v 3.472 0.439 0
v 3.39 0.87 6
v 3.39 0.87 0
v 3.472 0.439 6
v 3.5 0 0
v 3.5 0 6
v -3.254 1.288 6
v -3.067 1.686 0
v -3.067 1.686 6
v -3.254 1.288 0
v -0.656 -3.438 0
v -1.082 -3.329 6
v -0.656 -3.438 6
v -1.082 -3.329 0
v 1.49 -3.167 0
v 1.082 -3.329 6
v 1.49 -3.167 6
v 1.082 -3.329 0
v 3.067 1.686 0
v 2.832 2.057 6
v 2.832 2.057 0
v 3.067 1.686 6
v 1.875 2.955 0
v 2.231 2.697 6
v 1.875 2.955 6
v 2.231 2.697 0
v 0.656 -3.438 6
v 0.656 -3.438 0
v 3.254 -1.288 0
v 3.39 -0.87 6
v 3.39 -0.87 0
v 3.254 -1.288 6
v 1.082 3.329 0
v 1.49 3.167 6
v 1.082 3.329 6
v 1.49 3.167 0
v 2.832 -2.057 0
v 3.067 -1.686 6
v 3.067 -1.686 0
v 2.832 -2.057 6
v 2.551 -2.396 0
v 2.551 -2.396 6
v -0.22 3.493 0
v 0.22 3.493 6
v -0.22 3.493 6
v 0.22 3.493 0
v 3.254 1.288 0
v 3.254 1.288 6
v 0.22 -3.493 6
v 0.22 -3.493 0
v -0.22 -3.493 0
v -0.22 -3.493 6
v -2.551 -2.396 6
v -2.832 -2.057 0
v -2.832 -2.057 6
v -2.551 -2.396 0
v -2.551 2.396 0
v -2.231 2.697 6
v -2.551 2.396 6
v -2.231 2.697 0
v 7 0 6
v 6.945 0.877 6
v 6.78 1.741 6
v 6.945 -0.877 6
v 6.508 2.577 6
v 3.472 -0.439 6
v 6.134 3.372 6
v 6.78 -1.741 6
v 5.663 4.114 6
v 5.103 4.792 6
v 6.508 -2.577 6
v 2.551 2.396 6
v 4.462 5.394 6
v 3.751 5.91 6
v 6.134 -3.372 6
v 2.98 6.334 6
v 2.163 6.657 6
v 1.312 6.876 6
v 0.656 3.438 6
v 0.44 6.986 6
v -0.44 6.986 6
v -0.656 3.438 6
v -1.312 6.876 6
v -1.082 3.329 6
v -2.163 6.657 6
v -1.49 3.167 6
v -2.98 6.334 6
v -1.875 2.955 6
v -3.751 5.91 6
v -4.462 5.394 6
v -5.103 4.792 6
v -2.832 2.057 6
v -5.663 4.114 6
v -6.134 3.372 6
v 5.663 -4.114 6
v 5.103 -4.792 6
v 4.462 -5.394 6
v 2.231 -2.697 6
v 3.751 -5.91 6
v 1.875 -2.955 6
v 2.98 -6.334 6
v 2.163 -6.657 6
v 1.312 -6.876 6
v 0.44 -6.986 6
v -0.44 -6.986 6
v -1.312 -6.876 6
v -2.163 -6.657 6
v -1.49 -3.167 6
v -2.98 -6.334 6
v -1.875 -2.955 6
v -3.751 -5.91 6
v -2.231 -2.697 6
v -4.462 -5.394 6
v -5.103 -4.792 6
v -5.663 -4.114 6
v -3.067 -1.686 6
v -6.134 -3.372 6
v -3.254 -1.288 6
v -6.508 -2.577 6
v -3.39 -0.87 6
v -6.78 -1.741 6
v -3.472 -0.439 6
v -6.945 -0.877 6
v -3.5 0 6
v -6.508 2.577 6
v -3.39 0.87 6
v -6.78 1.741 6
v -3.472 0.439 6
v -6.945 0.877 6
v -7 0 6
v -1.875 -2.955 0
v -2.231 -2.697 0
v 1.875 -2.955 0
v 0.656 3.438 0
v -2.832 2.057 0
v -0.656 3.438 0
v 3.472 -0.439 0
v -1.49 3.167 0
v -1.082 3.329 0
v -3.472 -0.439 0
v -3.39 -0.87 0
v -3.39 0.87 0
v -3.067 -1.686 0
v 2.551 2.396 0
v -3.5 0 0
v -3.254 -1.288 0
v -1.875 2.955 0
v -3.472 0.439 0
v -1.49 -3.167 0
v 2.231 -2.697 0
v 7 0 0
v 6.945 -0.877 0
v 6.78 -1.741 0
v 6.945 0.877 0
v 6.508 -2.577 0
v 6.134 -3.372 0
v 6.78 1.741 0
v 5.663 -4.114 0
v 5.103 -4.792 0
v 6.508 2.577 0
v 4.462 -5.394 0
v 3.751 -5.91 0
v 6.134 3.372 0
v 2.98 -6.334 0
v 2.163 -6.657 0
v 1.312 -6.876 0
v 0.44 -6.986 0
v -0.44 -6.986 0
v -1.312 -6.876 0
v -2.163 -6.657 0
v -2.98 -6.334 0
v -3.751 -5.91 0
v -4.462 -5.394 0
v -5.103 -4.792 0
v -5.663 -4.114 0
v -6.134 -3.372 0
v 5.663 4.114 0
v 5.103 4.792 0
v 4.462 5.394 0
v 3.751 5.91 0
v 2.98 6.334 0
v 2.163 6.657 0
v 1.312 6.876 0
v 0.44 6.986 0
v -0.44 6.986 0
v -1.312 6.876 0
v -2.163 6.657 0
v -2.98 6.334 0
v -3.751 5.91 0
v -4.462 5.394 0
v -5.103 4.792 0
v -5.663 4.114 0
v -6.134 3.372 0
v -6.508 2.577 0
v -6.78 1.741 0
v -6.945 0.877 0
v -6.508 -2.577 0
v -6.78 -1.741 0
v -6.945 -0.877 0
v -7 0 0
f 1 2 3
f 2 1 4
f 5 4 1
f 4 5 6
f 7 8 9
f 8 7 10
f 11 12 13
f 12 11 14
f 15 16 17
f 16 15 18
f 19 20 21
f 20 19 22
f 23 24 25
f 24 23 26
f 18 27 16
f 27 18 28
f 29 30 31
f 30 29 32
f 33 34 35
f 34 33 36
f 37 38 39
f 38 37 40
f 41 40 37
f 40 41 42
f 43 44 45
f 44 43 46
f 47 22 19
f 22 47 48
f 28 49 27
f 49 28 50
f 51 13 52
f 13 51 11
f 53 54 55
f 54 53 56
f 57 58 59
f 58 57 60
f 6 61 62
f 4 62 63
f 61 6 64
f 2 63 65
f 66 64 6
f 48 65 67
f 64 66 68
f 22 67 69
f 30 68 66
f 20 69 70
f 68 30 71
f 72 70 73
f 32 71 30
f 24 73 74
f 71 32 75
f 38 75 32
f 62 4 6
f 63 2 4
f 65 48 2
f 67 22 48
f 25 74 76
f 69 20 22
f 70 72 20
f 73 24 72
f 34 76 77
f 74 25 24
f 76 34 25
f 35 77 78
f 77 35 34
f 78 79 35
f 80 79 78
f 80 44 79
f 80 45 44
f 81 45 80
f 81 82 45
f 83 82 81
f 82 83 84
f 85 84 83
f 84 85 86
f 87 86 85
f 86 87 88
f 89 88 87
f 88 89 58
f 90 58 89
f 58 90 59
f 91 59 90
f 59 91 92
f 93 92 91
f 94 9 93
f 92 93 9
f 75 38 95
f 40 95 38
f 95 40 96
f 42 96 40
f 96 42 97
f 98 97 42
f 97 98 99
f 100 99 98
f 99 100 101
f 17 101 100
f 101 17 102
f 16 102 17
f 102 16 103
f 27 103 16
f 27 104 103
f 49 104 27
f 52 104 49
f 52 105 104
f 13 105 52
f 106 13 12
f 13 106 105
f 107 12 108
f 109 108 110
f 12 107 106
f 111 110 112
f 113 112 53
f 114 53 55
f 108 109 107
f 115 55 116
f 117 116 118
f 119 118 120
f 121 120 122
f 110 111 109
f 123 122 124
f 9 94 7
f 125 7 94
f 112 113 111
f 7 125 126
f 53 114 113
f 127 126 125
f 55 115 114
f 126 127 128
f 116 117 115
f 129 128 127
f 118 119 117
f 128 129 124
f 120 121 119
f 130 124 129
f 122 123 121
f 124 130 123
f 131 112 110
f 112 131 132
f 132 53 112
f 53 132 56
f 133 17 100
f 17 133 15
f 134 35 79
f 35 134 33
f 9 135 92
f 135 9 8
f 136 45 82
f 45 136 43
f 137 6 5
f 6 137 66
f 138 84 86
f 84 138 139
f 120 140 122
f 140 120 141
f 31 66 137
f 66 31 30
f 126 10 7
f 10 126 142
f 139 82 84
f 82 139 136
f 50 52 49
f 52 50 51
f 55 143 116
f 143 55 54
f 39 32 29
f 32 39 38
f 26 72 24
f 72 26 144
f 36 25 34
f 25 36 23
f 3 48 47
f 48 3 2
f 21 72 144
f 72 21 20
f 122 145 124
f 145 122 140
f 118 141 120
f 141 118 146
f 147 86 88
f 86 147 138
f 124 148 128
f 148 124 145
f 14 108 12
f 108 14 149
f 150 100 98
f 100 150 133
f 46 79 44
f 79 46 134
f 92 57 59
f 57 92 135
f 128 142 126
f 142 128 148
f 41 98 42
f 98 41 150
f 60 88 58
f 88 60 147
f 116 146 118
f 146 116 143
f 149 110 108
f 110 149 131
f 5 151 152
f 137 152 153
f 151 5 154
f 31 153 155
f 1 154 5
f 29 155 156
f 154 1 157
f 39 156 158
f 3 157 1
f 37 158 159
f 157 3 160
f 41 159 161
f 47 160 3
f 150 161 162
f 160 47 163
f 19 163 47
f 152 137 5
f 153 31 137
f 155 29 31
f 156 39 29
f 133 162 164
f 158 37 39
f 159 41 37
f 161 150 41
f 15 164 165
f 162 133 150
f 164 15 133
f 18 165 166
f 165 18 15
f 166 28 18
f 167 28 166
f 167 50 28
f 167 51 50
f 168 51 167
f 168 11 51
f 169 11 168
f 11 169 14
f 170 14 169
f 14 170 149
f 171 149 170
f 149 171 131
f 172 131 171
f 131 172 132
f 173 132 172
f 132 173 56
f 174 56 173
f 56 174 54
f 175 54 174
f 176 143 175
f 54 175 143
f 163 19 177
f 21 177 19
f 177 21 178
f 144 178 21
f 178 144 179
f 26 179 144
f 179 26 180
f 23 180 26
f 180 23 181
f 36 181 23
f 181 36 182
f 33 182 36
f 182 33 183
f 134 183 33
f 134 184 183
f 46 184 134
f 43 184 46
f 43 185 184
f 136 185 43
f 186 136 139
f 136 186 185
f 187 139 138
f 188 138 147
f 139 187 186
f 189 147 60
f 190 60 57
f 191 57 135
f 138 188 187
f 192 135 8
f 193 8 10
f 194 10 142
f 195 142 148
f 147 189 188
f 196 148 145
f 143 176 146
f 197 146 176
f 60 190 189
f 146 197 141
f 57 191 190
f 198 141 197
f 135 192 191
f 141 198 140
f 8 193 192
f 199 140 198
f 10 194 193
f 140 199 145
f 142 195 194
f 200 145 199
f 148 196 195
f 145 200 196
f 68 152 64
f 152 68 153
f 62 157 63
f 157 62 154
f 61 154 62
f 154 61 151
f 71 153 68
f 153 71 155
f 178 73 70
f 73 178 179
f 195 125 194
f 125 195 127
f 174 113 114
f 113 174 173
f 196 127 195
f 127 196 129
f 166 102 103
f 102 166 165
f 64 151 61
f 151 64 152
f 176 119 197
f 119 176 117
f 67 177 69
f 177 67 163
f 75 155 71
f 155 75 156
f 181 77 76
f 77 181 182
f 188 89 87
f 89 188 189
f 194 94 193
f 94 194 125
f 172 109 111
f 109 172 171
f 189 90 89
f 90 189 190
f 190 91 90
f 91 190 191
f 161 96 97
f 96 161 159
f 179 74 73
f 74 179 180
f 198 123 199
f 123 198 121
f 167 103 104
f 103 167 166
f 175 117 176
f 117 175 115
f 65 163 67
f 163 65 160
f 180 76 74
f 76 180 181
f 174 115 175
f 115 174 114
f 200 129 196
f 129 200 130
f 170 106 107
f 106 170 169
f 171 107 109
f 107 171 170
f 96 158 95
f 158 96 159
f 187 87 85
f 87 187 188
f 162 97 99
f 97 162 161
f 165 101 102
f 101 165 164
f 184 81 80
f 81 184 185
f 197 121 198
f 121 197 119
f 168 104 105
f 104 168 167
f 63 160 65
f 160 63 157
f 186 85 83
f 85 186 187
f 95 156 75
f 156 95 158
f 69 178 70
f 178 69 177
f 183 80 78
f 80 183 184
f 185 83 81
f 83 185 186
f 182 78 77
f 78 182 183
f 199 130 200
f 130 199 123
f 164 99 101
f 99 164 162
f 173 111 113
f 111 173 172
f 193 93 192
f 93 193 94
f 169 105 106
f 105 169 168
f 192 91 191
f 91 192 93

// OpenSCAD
$fn = 50;


difference() {
	union() {
		cylinder(h = 6, r = 7.0000000000);
	}
	union() {
		#translate(v = [0.0000000000, 0.0000000000, -100.0000000000]) {
			cylinder(h = 200, r = 3.2500000000);
		}
		#translate(v = [0.0000000000, 0.0000000000, -100.0000000000]) {
			cylinder(h = 200, r = 3.2500000000);
		}
		#translate(v = [0.0000000000, 0.0000000000, -100.0000000000]) {
			cylinder(h = 200, r = 3.2500000000);
		}
		#translate(v = [0.0000000000, 0.0000000000, -100.0000000000]) {
			cylinder(h = 200, r = 3.2500000000);
		}
		#cylinder(h = 6, r = 3.5000000000);
	}
}
